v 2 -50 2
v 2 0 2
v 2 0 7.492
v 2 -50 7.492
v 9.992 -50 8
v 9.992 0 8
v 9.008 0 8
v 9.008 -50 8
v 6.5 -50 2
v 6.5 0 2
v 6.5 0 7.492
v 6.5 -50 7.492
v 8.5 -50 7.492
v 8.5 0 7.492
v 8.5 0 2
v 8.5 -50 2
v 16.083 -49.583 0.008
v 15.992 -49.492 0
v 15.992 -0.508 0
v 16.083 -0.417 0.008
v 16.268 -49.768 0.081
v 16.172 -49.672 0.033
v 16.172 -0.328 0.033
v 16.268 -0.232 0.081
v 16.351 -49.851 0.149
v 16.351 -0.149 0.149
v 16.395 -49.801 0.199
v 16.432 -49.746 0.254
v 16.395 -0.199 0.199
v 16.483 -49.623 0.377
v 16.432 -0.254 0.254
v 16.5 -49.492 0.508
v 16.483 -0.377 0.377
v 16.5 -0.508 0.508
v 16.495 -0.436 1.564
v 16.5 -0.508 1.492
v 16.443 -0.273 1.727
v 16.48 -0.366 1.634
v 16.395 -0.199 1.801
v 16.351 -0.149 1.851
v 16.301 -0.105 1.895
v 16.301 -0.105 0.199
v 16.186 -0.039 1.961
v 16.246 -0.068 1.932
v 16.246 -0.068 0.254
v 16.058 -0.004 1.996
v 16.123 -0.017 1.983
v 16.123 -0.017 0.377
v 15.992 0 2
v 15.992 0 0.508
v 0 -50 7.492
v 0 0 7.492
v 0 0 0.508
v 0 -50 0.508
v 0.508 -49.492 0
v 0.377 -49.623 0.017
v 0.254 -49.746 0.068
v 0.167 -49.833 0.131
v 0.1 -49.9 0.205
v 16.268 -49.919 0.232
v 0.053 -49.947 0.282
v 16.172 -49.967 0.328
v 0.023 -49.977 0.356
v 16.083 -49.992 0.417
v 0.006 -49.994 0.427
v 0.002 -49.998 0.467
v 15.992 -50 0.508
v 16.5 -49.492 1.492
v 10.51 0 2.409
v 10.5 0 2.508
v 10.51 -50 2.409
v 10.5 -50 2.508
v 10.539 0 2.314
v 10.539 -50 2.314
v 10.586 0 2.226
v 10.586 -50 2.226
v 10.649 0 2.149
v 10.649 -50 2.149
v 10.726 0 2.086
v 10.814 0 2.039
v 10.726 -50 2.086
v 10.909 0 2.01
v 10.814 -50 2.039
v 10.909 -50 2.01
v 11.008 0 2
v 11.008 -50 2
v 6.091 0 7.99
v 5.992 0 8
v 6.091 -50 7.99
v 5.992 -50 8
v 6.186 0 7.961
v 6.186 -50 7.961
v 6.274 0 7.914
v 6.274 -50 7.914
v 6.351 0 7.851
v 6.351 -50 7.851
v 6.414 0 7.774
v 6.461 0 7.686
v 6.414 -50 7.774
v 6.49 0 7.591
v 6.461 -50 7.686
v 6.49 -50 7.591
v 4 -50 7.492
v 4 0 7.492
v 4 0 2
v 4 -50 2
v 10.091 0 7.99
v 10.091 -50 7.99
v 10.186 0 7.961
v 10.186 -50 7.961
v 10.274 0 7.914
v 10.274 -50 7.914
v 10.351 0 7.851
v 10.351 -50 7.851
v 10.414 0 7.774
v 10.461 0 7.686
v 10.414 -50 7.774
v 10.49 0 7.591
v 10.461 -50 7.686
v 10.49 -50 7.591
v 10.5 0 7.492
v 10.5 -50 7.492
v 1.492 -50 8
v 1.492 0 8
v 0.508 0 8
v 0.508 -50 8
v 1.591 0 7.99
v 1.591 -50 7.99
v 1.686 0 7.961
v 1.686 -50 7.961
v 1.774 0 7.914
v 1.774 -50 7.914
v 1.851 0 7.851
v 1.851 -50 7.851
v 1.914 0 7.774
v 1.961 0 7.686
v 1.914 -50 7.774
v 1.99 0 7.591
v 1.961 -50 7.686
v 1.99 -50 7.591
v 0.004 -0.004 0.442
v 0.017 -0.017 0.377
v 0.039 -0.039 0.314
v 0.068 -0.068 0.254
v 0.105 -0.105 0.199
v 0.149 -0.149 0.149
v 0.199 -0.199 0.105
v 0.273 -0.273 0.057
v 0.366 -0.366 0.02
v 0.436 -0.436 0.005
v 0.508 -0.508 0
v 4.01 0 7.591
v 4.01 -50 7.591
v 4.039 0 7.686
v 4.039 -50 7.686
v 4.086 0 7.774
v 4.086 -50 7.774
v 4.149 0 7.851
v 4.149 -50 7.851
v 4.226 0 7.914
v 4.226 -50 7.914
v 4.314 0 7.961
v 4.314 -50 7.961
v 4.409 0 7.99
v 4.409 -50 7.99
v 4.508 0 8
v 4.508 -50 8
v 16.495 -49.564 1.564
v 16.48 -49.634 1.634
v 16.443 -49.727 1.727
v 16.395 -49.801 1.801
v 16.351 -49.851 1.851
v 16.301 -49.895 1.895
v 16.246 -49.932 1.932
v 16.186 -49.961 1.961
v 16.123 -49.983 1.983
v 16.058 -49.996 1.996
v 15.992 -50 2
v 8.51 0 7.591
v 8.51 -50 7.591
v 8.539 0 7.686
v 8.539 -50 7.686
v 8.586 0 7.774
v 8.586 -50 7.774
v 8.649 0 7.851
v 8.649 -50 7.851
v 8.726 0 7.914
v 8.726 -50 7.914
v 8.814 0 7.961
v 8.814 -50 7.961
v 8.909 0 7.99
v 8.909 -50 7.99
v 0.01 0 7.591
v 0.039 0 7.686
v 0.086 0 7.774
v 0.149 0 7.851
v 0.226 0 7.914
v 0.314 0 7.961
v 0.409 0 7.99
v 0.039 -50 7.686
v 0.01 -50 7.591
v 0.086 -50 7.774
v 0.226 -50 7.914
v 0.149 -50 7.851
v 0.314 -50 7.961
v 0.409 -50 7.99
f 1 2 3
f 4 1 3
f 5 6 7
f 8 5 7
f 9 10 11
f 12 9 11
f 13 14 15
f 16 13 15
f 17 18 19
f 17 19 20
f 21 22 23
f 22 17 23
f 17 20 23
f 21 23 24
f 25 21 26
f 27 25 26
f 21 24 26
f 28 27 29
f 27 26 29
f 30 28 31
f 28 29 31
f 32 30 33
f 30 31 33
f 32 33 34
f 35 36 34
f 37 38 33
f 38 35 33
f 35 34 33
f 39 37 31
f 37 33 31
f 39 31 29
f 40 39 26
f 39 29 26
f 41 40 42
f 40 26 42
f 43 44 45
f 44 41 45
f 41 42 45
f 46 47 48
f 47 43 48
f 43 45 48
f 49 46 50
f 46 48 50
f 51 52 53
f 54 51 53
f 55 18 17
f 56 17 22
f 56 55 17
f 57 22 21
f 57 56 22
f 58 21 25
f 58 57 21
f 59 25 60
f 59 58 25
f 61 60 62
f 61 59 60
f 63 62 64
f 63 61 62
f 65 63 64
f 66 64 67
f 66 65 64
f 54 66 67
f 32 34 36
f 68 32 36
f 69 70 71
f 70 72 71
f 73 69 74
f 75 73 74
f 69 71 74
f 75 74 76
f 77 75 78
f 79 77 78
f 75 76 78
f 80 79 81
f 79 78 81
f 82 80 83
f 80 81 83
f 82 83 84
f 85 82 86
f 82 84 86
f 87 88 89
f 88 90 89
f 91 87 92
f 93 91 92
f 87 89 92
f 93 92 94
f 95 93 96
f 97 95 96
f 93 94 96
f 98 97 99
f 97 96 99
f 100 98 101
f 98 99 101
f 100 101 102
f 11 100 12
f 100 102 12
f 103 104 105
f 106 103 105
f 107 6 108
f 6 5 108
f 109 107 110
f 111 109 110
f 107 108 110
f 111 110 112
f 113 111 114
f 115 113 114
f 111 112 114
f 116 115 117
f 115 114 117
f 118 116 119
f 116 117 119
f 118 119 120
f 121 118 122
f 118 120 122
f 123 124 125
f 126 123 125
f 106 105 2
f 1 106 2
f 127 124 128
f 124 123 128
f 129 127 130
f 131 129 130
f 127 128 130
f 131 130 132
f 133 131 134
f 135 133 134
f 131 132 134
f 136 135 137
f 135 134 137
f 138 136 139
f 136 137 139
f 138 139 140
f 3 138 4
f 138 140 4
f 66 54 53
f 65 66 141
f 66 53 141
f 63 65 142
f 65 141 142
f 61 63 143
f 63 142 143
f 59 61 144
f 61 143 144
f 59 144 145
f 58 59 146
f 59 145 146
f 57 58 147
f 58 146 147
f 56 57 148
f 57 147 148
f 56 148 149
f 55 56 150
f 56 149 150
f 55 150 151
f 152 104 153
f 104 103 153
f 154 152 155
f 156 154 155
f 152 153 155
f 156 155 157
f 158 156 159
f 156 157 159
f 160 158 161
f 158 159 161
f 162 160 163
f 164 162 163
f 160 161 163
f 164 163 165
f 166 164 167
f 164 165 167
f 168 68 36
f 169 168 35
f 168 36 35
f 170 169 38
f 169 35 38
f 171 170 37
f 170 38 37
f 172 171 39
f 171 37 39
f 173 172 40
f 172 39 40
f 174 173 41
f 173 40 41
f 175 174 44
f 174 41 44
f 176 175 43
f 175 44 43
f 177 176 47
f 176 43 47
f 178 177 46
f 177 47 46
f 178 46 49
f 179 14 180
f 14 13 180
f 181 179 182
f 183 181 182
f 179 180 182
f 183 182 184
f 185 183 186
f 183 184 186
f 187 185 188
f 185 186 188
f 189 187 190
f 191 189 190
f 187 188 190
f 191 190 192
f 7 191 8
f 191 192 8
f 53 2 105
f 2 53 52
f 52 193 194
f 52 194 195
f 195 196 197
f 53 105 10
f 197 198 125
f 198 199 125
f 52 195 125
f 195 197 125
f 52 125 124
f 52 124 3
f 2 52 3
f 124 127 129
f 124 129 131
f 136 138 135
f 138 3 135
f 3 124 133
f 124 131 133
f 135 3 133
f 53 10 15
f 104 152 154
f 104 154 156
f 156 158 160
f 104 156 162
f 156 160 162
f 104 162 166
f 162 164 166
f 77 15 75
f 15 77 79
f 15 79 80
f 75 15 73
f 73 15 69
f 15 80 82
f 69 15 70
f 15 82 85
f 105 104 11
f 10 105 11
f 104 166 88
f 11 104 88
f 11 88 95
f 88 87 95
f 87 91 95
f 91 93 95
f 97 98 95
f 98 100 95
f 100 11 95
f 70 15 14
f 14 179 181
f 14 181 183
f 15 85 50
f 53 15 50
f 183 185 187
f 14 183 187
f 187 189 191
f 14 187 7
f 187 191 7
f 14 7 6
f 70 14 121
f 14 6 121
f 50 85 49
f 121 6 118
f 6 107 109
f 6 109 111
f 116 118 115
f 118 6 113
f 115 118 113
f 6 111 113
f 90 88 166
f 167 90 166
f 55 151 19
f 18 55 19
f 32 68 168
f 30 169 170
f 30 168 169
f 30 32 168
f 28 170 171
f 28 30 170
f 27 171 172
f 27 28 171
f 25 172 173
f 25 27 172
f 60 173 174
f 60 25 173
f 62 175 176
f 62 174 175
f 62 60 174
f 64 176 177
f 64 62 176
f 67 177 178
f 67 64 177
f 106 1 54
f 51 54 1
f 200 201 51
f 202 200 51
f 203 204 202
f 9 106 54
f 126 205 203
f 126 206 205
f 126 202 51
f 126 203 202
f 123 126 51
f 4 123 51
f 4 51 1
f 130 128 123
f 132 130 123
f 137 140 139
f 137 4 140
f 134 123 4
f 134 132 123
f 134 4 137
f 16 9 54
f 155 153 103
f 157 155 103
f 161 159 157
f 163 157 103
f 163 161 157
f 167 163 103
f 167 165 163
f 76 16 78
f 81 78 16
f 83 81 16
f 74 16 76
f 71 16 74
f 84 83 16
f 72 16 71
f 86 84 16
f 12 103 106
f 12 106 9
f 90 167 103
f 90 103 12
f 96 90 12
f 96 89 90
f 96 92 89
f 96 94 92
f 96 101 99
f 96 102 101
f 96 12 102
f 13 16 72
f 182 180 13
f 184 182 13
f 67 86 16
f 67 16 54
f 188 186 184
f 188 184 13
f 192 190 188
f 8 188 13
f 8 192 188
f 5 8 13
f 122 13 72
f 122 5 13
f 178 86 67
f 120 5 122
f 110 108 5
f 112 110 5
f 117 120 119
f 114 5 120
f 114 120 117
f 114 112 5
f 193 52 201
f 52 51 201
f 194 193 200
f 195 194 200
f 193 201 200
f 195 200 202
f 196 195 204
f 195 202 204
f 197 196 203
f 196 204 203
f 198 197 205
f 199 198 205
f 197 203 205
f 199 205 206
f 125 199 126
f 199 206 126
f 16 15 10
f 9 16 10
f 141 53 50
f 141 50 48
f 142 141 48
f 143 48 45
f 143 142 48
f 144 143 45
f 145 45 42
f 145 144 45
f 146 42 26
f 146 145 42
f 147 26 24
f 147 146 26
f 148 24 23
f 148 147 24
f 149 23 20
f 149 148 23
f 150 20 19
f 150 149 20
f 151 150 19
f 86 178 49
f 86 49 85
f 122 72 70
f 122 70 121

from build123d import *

# Parameters (mm, degrees)
F1_DEPTH    = 50
F2_T1_DEPTH = 52.54
F2_T3_DEPTH = 4.54
F3_R        = 0.508
F4_T1_DEPTH = 18.532
F4_T3_DEPTH = 52.54
F5_R        = 0.508


# Not quite as in the source:
# - a fillet or chamfer that OpenCascade refuses, or shapes differently, is made with other operations: its cross-section is extruded or revolved along the edge and cut away or added


with BuildPart() as f1:
    # F0 (on Front) → F1 (new body)
    with BuildSketch(Plane.XZ):
        Polygon((0, 8), (0, 0), (16.5, 0), (16.5, 2), (10.5, 2), (10.5, 8), (8.5, 8), (8.5, 2), (6.5, 2), (6.5, 8), (4, 8), (4, 2), (2, 2), (2, 8), align=None)
    extrude(amount=F1_DEPTH)

    # F2: fillet of radius 0.508 on 4 edges, made by hand

    # F2_s2 → F2_t1 (cut)
    with BuildSketch(Plane.XZ.offset(-1.27)):
        with BuildLine():
            ThreePointArc((15.992, 0), (16.3512102448, 0.1487897552), (16.5, 0.508))
            Line((16.5, 0.508), (16.5, 0))
            Line((16.5, 0), (15.992, 0))
        make_face()
        with BuildLine():
            ThreePointArc((16.5, 1.492), (16.3512102448, 1.8512102448), (15.992, 2))
            Line((15.992, 2), (16.5, 2))
            Line((16.5, 2), (16.5, 1.492))
        make_face()
    extrude(amount=F2_T1_DEPTH, mode=Mode.SUBTRACT)

    # F2_s4 → F2_t3 (cut)
    with BuildSketch(Plane.XY.offset(-1.27)):
        with BuildLine():
            ThreePointArc((16.5, -0.508), (16.3512102448, -0.1487897552), (15.992, 0))
            Line((15.992, 0), (16.5, 0))
            Line((16.5, 0), (16.5, -0.508))
        make_face()
        with BuildLine():
            ThreePointArc((16.5, -49.492), (16.3512102448, -49.8512102448), (15.992, -50))
            Line((15.992, -50), (16.5, -50))
            Line((16.5, -50), (16.5, -49.492))
        make_face()
    extrude(amount=F2_T3_DEPTH, mode=Mode.SUBTRACT)

    # F3
    f3_edges = [f1.edges().sort_by_distance(p)[0] for p in [
        (8.5, -25, 8),
        (10.5, -25, 8),
        (6.5, -25, 8),
        (4, -25, 8),
        (2, -25, 8),
        (0, -25, 8),
    ]]
    fillet(f3_edges, radius=F3_R)

    # F4: fillet of radius 0.508 on 4 edges, made by hand

    # F4_s2 → F4_t1 (cut)
    with BuildSketch(Plane.YZ.offset(-1.27)):
        with BuildLine():
            ThreePointArc((0, 0.508), (-0.1487897552, 0.1487897552), (-0.508, 0))
            Line((-0.508, 0), (0, 0))
            Line((0, 0), (0, 0.508))
        make_face()
        with BuildLine():
            ThreePointArc((-49.492, 0), (-49.8512102448, 0.1487897552), (-50, 0.508))
            Line((-50, 0.508), (-50, 0))
            Line((-50, 0), (-49.492, 0))
        make_face()
    extrude(amount=F4_T1_DEPTH, mode=Mode.SUBTRACT)

    # F4_s4 → F4_t3 (cut)
    with BuildSketch(Plane.XZ.offset(-1.27)):
        with BuildLine():
            ThreePointArc((0, 0.508), (0.1487897552, 0.1487897552), (0.508, 0))
            Line((0.508, 0), (0, 0))
            Line((0, 0), (0, 0.508))
        make_face()
    extrude(amount=F4_T3_DEPTH, mode=Mode.SUBTRACT)

    # F5
    f5_edges = [f1.edges().sort_by_distance(p)[0] for p in [
        (10.5, -25, 2),
    ]]
    fillet(f5_edges, radius=F5_R)


solid = f1.part
